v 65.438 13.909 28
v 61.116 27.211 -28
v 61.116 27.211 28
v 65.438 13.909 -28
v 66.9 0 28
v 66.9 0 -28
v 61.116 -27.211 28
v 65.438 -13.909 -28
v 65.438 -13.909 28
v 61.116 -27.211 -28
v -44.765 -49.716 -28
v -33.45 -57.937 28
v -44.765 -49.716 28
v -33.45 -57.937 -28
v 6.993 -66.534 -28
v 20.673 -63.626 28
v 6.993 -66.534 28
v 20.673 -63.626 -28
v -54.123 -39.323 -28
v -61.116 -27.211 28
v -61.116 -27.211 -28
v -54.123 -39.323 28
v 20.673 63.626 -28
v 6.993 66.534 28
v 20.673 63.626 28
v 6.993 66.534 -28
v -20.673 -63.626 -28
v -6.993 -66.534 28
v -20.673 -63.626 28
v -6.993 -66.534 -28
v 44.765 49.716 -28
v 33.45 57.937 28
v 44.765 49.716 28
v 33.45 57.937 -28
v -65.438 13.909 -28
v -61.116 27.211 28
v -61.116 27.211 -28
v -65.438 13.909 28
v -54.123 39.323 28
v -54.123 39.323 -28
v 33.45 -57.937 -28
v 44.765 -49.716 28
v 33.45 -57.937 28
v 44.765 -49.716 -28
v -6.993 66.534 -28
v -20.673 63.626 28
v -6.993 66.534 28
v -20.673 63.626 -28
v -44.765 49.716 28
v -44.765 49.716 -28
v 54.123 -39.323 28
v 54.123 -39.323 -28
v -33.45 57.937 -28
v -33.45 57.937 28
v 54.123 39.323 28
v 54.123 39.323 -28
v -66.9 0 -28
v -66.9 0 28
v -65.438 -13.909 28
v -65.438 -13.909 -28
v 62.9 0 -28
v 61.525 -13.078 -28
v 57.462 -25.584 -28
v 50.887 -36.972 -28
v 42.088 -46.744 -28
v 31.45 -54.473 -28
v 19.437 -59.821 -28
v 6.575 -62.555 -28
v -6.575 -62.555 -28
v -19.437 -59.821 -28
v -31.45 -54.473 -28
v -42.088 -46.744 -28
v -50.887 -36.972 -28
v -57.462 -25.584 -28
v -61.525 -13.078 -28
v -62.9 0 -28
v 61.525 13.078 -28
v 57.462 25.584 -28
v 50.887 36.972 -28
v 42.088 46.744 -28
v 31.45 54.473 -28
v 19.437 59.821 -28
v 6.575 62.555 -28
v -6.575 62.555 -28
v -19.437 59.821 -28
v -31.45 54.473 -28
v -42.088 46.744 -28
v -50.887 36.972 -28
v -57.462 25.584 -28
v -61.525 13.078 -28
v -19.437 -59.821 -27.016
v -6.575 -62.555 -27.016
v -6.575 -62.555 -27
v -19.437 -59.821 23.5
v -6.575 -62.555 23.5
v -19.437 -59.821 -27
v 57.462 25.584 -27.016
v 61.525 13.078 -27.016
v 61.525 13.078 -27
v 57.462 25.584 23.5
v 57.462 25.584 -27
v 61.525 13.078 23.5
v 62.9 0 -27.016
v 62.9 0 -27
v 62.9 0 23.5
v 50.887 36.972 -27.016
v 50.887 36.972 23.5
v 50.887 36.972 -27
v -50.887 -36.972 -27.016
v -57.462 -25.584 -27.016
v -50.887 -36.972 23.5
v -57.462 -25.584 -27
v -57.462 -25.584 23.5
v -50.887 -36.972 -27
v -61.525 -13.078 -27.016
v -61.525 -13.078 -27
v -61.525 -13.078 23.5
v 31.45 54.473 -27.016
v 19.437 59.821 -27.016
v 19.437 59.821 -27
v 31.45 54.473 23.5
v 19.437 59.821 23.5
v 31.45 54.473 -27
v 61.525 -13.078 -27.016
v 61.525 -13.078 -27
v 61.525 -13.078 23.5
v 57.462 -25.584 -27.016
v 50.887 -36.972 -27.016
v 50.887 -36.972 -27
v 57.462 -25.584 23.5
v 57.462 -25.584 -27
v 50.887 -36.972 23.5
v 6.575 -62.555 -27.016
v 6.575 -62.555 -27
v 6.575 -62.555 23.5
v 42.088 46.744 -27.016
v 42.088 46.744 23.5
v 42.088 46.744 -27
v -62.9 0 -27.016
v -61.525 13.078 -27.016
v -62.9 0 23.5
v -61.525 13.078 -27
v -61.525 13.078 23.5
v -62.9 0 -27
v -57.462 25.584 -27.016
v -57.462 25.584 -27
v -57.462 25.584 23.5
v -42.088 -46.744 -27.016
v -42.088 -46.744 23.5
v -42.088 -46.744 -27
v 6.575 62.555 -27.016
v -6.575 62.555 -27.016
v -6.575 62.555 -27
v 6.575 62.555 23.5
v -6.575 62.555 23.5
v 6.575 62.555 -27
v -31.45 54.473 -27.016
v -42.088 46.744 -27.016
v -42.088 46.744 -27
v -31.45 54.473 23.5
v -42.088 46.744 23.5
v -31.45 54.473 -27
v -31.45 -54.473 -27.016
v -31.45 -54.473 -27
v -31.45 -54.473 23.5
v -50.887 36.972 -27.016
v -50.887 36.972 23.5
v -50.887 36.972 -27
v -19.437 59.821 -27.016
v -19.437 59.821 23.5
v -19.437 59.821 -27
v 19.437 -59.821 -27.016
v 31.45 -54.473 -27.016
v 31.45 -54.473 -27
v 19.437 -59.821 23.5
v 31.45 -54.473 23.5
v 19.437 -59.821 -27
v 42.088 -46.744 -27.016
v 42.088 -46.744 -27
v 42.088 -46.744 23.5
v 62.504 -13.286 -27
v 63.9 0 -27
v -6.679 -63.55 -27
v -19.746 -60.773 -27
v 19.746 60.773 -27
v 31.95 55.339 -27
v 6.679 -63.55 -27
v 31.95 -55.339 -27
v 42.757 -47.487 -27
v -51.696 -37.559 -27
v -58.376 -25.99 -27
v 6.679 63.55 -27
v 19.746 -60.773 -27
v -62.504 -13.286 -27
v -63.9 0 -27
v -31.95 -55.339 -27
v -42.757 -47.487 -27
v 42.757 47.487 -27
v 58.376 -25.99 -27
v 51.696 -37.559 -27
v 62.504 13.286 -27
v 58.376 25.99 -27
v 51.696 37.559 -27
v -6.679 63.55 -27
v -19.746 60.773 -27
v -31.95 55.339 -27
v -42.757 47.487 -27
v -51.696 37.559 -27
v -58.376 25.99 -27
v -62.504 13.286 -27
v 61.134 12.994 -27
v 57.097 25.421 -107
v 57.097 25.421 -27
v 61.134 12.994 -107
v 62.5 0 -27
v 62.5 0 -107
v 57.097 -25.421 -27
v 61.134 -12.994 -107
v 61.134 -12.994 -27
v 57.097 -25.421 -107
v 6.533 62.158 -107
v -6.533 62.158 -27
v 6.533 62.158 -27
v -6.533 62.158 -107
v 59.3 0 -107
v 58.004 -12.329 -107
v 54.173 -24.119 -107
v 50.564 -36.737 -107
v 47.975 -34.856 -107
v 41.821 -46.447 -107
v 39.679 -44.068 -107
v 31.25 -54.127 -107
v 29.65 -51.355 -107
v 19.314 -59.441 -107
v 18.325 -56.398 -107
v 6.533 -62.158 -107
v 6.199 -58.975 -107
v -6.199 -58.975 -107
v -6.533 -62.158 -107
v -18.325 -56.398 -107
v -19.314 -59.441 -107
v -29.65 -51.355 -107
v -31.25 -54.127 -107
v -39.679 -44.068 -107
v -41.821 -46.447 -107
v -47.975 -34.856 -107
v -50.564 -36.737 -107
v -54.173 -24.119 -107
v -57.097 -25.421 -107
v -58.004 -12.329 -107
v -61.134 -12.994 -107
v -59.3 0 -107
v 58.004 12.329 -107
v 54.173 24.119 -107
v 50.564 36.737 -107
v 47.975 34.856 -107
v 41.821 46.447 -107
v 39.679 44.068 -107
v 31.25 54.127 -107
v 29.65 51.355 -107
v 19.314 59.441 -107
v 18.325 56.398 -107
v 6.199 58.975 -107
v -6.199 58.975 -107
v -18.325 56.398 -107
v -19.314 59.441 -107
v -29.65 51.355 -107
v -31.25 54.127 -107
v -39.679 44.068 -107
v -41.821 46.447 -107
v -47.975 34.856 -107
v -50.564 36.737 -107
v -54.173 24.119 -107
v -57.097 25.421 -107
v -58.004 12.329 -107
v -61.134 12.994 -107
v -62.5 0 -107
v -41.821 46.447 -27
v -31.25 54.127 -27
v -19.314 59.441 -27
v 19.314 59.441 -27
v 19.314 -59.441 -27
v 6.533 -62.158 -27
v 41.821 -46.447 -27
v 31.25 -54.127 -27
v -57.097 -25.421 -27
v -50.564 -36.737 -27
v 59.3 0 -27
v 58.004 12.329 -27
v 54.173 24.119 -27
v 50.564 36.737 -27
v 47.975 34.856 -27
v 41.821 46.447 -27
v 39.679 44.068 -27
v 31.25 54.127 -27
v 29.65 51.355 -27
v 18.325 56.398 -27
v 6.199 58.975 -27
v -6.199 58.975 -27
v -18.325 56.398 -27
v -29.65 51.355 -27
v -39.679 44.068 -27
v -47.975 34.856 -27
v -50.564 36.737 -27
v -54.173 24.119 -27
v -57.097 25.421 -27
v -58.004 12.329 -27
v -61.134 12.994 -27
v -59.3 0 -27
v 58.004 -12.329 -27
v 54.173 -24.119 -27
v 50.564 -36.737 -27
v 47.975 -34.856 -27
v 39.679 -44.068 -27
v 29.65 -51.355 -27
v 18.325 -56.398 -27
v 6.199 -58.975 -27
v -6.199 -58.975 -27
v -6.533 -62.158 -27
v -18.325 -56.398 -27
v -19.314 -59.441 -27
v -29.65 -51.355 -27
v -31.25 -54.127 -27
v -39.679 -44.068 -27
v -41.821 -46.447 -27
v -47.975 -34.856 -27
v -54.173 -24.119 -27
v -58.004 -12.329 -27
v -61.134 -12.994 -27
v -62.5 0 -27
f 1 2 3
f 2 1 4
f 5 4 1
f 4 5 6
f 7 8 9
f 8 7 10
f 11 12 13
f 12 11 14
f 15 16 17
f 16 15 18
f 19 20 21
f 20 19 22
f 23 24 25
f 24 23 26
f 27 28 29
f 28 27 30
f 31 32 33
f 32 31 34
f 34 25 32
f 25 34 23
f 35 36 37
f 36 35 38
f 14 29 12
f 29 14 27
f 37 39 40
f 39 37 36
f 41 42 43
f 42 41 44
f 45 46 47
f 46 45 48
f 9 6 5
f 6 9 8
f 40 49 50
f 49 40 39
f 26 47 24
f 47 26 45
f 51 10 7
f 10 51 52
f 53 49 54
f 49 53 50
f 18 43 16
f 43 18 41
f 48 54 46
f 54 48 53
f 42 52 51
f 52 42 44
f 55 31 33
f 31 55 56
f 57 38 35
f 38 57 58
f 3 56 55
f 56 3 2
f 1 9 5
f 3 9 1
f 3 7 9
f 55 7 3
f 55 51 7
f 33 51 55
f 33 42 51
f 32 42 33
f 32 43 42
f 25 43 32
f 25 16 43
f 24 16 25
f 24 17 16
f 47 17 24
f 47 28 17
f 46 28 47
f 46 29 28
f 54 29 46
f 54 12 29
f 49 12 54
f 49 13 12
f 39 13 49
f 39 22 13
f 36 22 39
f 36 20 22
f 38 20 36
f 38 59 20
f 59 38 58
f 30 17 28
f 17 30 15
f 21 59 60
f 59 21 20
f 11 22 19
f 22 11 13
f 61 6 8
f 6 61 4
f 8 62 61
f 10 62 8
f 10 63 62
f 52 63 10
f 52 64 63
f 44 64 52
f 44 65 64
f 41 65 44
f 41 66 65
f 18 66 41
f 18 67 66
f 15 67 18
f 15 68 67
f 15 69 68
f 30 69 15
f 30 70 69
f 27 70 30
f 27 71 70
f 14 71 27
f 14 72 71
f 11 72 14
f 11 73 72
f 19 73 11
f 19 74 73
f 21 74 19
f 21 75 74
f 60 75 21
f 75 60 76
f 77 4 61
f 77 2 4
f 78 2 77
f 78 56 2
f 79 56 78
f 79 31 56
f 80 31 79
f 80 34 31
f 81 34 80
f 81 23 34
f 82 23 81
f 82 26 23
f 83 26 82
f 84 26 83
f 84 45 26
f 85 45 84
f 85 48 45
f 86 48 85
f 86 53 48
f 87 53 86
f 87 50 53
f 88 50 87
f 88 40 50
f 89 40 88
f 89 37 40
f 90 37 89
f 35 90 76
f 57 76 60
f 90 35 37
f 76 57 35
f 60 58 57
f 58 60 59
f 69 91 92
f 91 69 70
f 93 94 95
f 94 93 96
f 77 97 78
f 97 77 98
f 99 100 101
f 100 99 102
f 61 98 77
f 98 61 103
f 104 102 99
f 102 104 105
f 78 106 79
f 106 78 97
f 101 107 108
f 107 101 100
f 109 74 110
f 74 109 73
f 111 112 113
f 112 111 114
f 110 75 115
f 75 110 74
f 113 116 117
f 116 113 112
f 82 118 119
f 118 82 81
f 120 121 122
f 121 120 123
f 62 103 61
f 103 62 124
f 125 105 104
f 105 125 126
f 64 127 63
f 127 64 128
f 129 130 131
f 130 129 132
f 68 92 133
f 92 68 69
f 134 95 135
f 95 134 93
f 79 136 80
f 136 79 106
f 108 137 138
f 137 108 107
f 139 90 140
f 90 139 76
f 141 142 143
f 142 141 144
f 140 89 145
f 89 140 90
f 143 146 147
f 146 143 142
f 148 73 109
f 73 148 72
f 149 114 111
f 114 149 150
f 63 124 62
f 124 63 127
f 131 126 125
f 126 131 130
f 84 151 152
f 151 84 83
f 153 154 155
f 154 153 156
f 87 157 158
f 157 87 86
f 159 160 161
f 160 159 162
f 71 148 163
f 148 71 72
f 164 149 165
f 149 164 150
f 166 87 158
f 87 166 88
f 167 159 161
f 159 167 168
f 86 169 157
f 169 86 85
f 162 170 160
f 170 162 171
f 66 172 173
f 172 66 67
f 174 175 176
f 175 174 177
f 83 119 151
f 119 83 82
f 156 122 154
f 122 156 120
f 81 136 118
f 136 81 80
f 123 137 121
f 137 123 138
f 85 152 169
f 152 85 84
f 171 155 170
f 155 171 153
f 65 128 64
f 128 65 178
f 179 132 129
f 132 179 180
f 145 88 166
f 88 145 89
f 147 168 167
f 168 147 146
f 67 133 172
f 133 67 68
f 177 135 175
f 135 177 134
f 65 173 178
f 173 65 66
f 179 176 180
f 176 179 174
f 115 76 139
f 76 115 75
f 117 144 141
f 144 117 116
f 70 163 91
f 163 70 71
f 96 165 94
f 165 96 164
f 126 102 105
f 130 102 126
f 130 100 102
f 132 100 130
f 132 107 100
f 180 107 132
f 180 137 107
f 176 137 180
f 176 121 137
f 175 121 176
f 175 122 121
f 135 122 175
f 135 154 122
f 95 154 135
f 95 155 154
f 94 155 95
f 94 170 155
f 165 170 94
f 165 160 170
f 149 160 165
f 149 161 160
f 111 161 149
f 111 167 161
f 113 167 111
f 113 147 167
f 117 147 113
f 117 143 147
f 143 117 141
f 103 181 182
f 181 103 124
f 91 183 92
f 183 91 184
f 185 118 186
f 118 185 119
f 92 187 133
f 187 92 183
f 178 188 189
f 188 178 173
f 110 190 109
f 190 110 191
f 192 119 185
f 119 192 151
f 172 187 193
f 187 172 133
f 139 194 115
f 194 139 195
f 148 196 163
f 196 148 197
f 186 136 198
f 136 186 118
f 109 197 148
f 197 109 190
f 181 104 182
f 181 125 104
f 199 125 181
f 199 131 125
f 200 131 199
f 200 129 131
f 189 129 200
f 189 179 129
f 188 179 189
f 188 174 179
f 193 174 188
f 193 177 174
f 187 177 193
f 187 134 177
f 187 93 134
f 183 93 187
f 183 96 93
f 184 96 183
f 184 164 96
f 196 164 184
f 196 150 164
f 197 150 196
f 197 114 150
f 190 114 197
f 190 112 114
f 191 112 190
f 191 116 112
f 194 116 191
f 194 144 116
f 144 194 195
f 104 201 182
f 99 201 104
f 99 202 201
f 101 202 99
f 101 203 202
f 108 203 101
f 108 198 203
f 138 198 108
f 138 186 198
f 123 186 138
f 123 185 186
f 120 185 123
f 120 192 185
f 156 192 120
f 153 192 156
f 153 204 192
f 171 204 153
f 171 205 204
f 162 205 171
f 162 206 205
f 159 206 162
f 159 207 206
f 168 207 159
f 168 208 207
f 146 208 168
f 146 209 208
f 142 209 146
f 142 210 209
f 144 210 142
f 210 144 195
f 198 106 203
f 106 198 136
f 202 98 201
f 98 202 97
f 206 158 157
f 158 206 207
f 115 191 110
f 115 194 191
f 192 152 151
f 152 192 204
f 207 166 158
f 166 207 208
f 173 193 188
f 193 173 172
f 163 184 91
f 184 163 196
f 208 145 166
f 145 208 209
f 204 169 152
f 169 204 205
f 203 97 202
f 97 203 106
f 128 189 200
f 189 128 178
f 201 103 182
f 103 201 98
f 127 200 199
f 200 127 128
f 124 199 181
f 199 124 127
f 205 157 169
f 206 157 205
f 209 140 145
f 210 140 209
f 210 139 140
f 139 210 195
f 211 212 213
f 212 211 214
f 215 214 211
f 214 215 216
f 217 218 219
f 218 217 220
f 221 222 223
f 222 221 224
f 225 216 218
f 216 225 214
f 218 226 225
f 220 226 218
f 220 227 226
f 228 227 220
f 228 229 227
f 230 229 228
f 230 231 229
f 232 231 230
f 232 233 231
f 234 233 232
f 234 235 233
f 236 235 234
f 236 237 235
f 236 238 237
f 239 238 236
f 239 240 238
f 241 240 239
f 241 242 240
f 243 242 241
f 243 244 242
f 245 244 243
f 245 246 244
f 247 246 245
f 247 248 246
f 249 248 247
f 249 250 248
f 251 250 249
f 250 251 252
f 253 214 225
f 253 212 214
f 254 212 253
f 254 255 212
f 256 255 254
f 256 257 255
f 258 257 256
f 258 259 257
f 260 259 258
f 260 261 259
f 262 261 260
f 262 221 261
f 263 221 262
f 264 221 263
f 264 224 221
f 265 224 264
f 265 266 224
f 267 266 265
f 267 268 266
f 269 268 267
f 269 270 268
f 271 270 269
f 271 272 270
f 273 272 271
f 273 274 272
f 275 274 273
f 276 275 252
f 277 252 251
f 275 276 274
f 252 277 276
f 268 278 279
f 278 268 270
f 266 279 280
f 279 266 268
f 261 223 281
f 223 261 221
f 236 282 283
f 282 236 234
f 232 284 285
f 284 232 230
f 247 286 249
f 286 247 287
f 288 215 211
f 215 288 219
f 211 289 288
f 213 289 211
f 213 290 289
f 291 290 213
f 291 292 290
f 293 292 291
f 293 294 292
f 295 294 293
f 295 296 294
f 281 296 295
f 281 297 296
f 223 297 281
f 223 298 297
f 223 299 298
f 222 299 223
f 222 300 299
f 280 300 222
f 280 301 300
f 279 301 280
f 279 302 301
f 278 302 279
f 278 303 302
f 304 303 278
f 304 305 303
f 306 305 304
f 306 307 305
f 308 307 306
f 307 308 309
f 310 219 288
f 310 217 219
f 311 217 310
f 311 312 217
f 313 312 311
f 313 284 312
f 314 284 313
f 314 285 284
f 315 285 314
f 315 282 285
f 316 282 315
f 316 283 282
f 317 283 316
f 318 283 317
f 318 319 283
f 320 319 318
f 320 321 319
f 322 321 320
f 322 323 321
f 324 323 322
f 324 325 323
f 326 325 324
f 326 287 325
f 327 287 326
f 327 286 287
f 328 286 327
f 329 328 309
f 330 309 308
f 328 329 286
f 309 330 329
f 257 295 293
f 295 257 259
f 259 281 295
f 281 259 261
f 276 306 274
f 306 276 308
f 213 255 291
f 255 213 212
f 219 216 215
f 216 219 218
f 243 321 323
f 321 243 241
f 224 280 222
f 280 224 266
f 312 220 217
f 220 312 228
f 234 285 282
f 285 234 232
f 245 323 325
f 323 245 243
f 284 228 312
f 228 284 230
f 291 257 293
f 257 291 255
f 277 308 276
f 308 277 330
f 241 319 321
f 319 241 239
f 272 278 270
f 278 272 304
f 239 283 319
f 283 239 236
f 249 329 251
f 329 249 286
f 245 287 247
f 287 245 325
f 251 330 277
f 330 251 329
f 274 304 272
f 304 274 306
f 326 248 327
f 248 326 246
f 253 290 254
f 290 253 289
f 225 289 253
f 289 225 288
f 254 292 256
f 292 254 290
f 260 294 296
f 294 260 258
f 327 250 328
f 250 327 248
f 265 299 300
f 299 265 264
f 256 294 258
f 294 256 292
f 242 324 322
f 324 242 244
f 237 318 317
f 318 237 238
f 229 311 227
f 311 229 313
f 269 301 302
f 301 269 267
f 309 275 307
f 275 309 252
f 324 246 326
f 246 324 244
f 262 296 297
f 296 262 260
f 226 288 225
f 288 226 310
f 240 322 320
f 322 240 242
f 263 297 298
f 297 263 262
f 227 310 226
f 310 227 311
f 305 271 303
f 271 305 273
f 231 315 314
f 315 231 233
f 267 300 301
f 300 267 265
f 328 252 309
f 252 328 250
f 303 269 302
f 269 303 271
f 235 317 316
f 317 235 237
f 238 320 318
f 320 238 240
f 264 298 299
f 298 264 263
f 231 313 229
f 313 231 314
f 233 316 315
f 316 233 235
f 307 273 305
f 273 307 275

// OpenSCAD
// Parameters
nominal_size = 125; //[60:250:1]
pipe_od_mm = 125; //[60:250:1]
pipe_wall_mm = 3.2; //[1.6:6.4:0.1]
socket_clearance_mm = 0.4; //[0.1:1.0:0.05]
socket_insertion_depth_mm = 50; //[25:100:1]
cap_wall_thickness_mm = 4; //[2:10:0.5]
end_plate_thickness_mm = 6; //[3:15:0.5]
outer_edge_fillet_radius_mm = 1.5; //[0.5:4:0.25]
inner_lead_in_chamfer_mm = 1.0; //[0.5:3.0:0.25]
stop_shoulder_height_mm = 2.0; //[1.0:5.0:0.25]
overlap_mm = 1.0; //[0.5:2.0:0.1]
pipe_length_mm = 80; //[40:200:1]

// HT Pipe - complete geometry
module ht_pipe() {
  color([0.85, 0.85, 0.8]) {
    difference() {
      // Outer pipe
      cylinder(h=pipe_length_mm, r=pipe_od_mm/2, center=true);
      // Inner void
      translate([0, 0, -overlap_mm/2])
        cylinder(h=pipe_length_mm + overlap_mm, r=pipe_od_mm/2 - pipe_wall_mm, center=true);
    }
  }
}

// Cap Assembly
module cap_assembly() {
  color([0.85, 0.85, 0.8]) {
    // Cap shell outer
    difference() {
      union() {
        // Cap shell outer
        cylinder(h=socket_insertion_depth_mm + end_plate_thickness_mm, 
                 r=pipe_od_mm/2 + socket_clearance_mm + cap_wall_thickness_mm, center=true);
        // Closed end plate
        translate([0, 0, (socket_insertion_depth_mm + end_plate_thickness_mm)/2 - end_plate_thickness_mm/2])
          cylinder(h=end_plate_thickness_mm, 
                   r=pipe_od_mm/2 + socket_clearance_mm + cap_wall_thickness_mm, center=true);
        // Insertion stop shoulder ring
        translate([0, 0, (socket_insertion_depth_mm + end_plate_thickness_mm)/2 - end_plate_thickness_mm - stop_shoulder_height_mm/2 + overlap_mm])
          cylinder(h=stop_shoulder_height_mm, 
                   r=pipe_od_mm/2 + socket_clearance_mm + cap_wall_thickness_mm, center=true);
      }
      // Pipe socket interface void
      translate([0, 0, (socket_insertion_depth_mm + overlap_mm)/2 - (socket_insertion_depth_mm + end_plate_thickness_mm)/2])
        cylinder(h=socket_insertion_depth_mm + overlap_mm, 
                 r=pipe_od_mm/2 + socket_clearance_mm, center=true);
      // Insertion stop shoulder inner void
      translate([0, 0, (socket_insertion_depth_mm + end_plate_thickness_mm)/2 - end_plate_thickness_mm - stop_shoulder_height_mm/2 + overlap_mm])
        cylinder(h=stop_shoulder_height_mm + overlap_mm, 
                 r=pipe_od_mm/2 + socket_clearance_mm, center=true);
      // Lead-in chamfer cone cut
      translate([0, 0, -(socket_insertion_depth_mm + end_plate_thickness_mm)/2 + inner_lead_in_chamfer_mm/2])
        rotate([180, 0, 0])
        cylinder(h=inner_lead_in_chamfer_mm, 
                 r1=pipe_od_mm/2 + socket_clearance_mm + inner_lead_in_chamfer_mm, r2=0, center=true);
    }
  }
  // HT Pipe
  translate([0, 0, -(socket_insertion_depth_mm + end_plate_thickness_mm)/2 - pipe_length_mm/2 + overlap_mm])
    ht_pipe();
}

// Final assembly
module assembly() {
  cap_assembly();
}

assembly();
